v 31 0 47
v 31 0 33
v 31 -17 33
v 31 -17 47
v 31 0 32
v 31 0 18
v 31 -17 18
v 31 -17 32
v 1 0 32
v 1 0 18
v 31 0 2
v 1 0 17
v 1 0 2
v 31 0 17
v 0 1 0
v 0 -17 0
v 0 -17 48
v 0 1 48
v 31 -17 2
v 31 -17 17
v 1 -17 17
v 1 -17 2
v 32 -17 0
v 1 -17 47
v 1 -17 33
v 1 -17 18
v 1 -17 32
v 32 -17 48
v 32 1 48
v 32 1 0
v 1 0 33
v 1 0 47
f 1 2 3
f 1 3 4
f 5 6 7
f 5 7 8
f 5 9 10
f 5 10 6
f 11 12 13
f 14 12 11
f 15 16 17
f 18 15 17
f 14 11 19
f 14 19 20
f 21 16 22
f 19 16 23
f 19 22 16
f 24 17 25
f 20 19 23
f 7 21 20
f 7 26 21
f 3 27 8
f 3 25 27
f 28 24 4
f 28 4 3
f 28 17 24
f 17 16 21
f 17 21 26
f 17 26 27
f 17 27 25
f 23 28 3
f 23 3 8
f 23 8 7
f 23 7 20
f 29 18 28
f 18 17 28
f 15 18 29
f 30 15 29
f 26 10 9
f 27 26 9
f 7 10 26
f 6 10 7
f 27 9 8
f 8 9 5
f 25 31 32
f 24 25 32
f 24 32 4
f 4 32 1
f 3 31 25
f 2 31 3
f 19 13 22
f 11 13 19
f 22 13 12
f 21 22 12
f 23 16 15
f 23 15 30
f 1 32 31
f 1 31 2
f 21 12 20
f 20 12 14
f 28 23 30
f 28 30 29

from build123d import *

# Parameters (mm, degrees)
F0_W     = 32
F0_H     = 48
F0_W_2   = 30
F0_H_2   = 15
F0_H_3   = 14
F1_DEPTH = 17
F2_W     = 32
F2_H     = 48
F3_DEPTH = 1


with BuildPart() as f1:
    # F0 (on Front) → F1 (new body)
    with BuildSketch(Plane.XZ):
        with Locations((16, 24)):
            Rectangle(F0_W, F0_H)
        with Locations((16, 9.5)):
            Rectangle(F0_W_2, F0_H_2, mode=Mode.SUBTRACT)
        with Locations((16, 25)):
            Rectangle(F0_W_2, F0_H_3, mode=Mode.SUBTRACT)
        with Locations((16, 40)):
            Rectangle(F0_W_2, F0_H_3, mode=Mode.SUBTRACT)
    extrude(amount=F1_DEPTH)

    # F2 (on Front) → F3 (join)
    with BuildSketch(Plane.XZ):
        with Locations((16, 24)):
            Rectangle(F2_W, F2_H)
    extrude(amount=-F3_DEPTH)


solid = f1.part
